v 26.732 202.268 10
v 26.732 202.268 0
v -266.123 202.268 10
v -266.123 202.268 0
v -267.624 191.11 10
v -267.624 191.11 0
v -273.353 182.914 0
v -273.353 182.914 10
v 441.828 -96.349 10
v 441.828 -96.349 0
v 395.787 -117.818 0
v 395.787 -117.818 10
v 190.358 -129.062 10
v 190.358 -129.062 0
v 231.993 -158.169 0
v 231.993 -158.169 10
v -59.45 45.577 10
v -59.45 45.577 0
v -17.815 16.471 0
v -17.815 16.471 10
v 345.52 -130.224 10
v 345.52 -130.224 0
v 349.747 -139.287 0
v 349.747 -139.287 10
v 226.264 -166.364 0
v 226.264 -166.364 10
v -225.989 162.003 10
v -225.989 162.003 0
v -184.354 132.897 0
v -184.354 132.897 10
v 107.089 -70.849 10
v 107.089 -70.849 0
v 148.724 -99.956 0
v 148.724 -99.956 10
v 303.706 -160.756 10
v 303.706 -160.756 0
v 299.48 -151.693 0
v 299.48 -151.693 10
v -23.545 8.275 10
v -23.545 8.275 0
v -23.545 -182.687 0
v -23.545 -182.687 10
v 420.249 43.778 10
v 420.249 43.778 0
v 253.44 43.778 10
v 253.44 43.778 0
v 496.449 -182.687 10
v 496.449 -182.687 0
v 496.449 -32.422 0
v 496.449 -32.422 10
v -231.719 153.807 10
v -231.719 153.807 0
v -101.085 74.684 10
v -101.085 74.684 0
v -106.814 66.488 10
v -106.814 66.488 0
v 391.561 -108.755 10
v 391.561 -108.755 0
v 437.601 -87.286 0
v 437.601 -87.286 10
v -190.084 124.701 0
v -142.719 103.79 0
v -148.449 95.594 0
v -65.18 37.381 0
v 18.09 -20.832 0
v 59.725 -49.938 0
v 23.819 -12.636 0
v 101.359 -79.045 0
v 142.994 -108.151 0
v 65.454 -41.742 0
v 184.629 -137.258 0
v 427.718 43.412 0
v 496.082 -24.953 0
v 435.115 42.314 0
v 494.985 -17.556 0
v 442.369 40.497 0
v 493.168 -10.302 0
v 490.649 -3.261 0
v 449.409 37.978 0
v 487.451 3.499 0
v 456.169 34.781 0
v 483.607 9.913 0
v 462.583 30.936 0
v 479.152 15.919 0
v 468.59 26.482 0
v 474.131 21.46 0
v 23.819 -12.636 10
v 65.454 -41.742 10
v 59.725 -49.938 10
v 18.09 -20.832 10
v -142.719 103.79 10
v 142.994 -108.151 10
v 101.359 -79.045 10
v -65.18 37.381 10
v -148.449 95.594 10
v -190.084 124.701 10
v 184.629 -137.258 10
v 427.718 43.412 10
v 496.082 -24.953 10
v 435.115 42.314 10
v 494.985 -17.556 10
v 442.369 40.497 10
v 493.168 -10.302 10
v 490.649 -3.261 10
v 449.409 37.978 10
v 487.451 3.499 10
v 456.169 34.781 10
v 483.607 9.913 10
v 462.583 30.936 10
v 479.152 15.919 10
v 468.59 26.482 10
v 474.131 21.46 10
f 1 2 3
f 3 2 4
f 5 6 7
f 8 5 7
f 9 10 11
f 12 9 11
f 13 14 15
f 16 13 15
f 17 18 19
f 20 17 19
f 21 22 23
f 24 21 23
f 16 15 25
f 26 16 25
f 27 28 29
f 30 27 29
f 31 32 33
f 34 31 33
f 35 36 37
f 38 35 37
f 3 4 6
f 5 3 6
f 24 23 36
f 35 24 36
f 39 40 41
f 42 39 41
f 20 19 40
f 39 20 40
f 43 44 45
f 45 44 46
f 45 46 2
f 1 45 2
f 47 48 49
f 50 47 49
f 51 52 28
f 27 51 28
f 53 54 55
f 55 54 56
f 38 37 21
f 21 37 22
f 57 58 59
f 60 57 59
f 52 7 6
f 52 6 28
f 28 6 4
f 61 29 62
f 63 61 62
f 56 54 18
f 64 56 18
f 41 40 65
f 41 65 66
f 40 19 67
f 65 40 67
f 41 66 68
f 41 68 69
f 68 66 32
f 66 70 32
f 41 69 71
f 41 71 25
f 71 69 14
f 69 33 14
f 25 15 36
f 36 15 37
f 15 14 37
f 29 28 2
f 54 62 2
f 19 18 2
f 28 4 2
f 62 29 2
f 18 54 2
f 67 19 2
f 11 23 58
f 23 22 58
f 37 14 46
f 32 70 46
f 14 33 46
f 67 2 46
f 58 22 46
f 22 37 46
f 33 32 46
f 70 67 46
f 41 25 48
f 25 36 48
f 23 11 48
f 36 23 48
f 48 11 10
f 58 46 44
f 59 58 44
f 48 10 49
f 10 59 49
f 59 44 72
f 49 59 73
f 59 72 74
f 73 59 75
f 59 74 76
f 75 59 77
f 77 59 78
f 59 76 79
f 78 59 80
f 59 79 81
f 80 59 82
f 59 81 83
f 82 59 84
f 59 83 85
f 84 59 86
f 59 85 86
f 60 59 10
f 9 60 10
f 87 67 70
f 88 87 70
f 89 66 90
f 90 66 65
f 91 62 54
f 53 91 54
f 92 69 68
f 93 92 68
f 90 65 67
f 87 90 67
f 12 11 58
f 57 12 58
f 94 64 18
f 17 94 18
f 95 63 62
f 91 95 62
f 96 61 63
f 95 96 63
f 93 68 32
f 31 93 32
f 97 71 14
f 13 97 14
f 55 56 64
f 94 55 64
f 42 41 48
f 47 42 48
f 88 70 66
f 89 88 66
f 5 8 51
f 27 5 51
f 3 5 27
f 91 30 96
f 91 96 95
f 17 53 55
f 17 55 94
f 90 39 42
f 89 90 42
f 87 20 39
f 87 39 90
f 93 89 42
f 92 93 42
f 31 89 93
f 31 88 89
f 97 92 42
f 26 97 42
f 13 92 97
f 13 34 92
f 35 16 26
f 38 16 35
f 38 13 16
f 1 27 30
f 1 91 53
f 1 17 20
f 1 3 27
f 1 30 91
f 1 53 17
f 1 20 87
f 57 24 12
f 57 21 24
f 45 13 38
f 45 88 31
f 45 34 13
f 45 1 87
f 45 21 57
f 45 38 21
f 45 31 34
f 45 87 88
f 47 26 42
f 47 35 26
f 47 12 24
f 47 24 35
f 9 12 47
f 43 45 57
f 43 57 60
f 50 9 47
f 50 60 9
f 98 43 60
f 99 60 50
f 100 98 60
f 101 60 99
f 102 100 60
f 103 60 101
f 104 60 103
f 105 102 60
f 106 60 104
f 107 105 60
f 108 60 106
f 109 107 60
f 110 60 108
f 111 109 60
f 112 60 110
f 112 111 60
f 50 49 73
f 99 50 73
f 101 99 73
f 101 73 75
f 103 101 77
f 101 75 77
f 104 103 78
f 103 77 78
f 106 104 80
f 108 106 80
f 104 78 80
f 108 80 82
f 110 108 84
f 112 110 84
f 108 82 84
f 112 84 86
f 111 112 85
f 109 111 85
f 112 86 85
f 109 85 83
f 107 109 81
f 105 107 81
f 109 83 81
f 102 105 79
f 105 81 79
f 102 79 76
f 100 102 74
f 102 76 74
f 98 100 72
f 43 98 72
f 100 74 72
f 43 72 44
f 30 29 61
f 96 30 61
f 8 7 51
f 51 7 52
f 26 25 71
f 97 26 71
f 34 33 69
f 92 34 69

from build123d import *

# Parameters (mm, degrees)
BOSS_EXTRUDE1_DEPTH = 10


with BuildPart() as part:
    # Sketch1 → Boss-Extrude1 (new body)
    with BuildSketch(Plane.XY):
        with BuildLine():
            Line((26.73180705, 202.268045215), (-266.122767511, 202.268045215))
            Line((-266.122767511, 202.268045215), (-267.623671515, 191.109569167))
            Line((-267.623671515, 191.109569167), (-273.353298876, 182.913754973))
            Line((-273.353298876, 182.913754973), (-231.718562767, 153.807247983))
            Line((-231.718562767, 153.807247983), (-225.988935407, 162.003062177))
            Line((-225.988935407, 162.003062177), (-184.354199298, 132.896555187))
            Line((-184.354199298, 132.896555187), (-190.083826658, 124.700740993))
            Line((-190.083826658, 124.700740993), (-148.449090549, 95.594234003))
            Line((-148.449090549, 95.594234003), (-142.719463189, 103.790048198))
            Line((-142.719463189, 103.790048198), (-101.084727081, 74.683541208))
            Line((-101.084727081, 74.683541208), (-106.814354441, 66.487727013))
            Line((-106.814354441, 66.487727013), (-65.179618332, 37.381220023))
            Line((-65.179618332, 37.381220023), (-59.449990972, 45.577034218))
            Line((-59.449990972, 45.577034218), (-17.815254863, 16.470527228))
            Line((-17.815254863, 16.470527228), (-23.544882223, 8.274713033))
            Line((-23.544882223, 8.274713033), (-23.544882223, -182.686538243))
            Line((-23.544882223, -182.686538243), (496.44897172, -182.686538243))
            Line((496.44897172, -182.686538243), (496.44897172, -32.421529871))
            ThreePointArc((496.44897172, -32.421529871), (474.130508447, 21.460006856), (420.24897172, 43.778470129))
            Line((420.24897172, 43.778470129), (253.439588816, 43.778470129))
            Line((253.439588816, 43.778470129), (26.73180705, 202.268045215))
        make_face()
        Polygon((23.819481246, -12.635979762), (65.454217354, -41.742486752), (59.724589994, -49.938300947), (18.089853885, -20.831793957), align=None, mode=Mode.SUBTRACT)
        Polygon((107.088953463, -70.848993742), (148.723689572, -99.955500732), (142.994062212, -108.151314927), (101.359326103, -79.044807937), align=None, mode=Mode.SUBTRACT)
        Polygon((190.358425681, -129.062007722), (231.993161789, -158.168514712), (226.263534429, -166.364328907), (184.62879832, -137.257821917), align=None, mode=Mode.SUBTRACT)
        Polygon((299.480024398, -151.692530547), (345.520459979, -130.22352285), (349.746642597, -139.28660072), (303.706207015, -160.755608417), align=None, mode=Mode.SUBTRACT)
        Polygon((391.560895561, -108.754515154), (437.601331142, -87.285507457), (441.82751376, -96.348585328), (395.787078178, -117.817593024), align=None, mode=Mode.SUBTRACT)
    extrude(amount=BOSS_EXTRUDE1_DEPTH)


solid = part.part
